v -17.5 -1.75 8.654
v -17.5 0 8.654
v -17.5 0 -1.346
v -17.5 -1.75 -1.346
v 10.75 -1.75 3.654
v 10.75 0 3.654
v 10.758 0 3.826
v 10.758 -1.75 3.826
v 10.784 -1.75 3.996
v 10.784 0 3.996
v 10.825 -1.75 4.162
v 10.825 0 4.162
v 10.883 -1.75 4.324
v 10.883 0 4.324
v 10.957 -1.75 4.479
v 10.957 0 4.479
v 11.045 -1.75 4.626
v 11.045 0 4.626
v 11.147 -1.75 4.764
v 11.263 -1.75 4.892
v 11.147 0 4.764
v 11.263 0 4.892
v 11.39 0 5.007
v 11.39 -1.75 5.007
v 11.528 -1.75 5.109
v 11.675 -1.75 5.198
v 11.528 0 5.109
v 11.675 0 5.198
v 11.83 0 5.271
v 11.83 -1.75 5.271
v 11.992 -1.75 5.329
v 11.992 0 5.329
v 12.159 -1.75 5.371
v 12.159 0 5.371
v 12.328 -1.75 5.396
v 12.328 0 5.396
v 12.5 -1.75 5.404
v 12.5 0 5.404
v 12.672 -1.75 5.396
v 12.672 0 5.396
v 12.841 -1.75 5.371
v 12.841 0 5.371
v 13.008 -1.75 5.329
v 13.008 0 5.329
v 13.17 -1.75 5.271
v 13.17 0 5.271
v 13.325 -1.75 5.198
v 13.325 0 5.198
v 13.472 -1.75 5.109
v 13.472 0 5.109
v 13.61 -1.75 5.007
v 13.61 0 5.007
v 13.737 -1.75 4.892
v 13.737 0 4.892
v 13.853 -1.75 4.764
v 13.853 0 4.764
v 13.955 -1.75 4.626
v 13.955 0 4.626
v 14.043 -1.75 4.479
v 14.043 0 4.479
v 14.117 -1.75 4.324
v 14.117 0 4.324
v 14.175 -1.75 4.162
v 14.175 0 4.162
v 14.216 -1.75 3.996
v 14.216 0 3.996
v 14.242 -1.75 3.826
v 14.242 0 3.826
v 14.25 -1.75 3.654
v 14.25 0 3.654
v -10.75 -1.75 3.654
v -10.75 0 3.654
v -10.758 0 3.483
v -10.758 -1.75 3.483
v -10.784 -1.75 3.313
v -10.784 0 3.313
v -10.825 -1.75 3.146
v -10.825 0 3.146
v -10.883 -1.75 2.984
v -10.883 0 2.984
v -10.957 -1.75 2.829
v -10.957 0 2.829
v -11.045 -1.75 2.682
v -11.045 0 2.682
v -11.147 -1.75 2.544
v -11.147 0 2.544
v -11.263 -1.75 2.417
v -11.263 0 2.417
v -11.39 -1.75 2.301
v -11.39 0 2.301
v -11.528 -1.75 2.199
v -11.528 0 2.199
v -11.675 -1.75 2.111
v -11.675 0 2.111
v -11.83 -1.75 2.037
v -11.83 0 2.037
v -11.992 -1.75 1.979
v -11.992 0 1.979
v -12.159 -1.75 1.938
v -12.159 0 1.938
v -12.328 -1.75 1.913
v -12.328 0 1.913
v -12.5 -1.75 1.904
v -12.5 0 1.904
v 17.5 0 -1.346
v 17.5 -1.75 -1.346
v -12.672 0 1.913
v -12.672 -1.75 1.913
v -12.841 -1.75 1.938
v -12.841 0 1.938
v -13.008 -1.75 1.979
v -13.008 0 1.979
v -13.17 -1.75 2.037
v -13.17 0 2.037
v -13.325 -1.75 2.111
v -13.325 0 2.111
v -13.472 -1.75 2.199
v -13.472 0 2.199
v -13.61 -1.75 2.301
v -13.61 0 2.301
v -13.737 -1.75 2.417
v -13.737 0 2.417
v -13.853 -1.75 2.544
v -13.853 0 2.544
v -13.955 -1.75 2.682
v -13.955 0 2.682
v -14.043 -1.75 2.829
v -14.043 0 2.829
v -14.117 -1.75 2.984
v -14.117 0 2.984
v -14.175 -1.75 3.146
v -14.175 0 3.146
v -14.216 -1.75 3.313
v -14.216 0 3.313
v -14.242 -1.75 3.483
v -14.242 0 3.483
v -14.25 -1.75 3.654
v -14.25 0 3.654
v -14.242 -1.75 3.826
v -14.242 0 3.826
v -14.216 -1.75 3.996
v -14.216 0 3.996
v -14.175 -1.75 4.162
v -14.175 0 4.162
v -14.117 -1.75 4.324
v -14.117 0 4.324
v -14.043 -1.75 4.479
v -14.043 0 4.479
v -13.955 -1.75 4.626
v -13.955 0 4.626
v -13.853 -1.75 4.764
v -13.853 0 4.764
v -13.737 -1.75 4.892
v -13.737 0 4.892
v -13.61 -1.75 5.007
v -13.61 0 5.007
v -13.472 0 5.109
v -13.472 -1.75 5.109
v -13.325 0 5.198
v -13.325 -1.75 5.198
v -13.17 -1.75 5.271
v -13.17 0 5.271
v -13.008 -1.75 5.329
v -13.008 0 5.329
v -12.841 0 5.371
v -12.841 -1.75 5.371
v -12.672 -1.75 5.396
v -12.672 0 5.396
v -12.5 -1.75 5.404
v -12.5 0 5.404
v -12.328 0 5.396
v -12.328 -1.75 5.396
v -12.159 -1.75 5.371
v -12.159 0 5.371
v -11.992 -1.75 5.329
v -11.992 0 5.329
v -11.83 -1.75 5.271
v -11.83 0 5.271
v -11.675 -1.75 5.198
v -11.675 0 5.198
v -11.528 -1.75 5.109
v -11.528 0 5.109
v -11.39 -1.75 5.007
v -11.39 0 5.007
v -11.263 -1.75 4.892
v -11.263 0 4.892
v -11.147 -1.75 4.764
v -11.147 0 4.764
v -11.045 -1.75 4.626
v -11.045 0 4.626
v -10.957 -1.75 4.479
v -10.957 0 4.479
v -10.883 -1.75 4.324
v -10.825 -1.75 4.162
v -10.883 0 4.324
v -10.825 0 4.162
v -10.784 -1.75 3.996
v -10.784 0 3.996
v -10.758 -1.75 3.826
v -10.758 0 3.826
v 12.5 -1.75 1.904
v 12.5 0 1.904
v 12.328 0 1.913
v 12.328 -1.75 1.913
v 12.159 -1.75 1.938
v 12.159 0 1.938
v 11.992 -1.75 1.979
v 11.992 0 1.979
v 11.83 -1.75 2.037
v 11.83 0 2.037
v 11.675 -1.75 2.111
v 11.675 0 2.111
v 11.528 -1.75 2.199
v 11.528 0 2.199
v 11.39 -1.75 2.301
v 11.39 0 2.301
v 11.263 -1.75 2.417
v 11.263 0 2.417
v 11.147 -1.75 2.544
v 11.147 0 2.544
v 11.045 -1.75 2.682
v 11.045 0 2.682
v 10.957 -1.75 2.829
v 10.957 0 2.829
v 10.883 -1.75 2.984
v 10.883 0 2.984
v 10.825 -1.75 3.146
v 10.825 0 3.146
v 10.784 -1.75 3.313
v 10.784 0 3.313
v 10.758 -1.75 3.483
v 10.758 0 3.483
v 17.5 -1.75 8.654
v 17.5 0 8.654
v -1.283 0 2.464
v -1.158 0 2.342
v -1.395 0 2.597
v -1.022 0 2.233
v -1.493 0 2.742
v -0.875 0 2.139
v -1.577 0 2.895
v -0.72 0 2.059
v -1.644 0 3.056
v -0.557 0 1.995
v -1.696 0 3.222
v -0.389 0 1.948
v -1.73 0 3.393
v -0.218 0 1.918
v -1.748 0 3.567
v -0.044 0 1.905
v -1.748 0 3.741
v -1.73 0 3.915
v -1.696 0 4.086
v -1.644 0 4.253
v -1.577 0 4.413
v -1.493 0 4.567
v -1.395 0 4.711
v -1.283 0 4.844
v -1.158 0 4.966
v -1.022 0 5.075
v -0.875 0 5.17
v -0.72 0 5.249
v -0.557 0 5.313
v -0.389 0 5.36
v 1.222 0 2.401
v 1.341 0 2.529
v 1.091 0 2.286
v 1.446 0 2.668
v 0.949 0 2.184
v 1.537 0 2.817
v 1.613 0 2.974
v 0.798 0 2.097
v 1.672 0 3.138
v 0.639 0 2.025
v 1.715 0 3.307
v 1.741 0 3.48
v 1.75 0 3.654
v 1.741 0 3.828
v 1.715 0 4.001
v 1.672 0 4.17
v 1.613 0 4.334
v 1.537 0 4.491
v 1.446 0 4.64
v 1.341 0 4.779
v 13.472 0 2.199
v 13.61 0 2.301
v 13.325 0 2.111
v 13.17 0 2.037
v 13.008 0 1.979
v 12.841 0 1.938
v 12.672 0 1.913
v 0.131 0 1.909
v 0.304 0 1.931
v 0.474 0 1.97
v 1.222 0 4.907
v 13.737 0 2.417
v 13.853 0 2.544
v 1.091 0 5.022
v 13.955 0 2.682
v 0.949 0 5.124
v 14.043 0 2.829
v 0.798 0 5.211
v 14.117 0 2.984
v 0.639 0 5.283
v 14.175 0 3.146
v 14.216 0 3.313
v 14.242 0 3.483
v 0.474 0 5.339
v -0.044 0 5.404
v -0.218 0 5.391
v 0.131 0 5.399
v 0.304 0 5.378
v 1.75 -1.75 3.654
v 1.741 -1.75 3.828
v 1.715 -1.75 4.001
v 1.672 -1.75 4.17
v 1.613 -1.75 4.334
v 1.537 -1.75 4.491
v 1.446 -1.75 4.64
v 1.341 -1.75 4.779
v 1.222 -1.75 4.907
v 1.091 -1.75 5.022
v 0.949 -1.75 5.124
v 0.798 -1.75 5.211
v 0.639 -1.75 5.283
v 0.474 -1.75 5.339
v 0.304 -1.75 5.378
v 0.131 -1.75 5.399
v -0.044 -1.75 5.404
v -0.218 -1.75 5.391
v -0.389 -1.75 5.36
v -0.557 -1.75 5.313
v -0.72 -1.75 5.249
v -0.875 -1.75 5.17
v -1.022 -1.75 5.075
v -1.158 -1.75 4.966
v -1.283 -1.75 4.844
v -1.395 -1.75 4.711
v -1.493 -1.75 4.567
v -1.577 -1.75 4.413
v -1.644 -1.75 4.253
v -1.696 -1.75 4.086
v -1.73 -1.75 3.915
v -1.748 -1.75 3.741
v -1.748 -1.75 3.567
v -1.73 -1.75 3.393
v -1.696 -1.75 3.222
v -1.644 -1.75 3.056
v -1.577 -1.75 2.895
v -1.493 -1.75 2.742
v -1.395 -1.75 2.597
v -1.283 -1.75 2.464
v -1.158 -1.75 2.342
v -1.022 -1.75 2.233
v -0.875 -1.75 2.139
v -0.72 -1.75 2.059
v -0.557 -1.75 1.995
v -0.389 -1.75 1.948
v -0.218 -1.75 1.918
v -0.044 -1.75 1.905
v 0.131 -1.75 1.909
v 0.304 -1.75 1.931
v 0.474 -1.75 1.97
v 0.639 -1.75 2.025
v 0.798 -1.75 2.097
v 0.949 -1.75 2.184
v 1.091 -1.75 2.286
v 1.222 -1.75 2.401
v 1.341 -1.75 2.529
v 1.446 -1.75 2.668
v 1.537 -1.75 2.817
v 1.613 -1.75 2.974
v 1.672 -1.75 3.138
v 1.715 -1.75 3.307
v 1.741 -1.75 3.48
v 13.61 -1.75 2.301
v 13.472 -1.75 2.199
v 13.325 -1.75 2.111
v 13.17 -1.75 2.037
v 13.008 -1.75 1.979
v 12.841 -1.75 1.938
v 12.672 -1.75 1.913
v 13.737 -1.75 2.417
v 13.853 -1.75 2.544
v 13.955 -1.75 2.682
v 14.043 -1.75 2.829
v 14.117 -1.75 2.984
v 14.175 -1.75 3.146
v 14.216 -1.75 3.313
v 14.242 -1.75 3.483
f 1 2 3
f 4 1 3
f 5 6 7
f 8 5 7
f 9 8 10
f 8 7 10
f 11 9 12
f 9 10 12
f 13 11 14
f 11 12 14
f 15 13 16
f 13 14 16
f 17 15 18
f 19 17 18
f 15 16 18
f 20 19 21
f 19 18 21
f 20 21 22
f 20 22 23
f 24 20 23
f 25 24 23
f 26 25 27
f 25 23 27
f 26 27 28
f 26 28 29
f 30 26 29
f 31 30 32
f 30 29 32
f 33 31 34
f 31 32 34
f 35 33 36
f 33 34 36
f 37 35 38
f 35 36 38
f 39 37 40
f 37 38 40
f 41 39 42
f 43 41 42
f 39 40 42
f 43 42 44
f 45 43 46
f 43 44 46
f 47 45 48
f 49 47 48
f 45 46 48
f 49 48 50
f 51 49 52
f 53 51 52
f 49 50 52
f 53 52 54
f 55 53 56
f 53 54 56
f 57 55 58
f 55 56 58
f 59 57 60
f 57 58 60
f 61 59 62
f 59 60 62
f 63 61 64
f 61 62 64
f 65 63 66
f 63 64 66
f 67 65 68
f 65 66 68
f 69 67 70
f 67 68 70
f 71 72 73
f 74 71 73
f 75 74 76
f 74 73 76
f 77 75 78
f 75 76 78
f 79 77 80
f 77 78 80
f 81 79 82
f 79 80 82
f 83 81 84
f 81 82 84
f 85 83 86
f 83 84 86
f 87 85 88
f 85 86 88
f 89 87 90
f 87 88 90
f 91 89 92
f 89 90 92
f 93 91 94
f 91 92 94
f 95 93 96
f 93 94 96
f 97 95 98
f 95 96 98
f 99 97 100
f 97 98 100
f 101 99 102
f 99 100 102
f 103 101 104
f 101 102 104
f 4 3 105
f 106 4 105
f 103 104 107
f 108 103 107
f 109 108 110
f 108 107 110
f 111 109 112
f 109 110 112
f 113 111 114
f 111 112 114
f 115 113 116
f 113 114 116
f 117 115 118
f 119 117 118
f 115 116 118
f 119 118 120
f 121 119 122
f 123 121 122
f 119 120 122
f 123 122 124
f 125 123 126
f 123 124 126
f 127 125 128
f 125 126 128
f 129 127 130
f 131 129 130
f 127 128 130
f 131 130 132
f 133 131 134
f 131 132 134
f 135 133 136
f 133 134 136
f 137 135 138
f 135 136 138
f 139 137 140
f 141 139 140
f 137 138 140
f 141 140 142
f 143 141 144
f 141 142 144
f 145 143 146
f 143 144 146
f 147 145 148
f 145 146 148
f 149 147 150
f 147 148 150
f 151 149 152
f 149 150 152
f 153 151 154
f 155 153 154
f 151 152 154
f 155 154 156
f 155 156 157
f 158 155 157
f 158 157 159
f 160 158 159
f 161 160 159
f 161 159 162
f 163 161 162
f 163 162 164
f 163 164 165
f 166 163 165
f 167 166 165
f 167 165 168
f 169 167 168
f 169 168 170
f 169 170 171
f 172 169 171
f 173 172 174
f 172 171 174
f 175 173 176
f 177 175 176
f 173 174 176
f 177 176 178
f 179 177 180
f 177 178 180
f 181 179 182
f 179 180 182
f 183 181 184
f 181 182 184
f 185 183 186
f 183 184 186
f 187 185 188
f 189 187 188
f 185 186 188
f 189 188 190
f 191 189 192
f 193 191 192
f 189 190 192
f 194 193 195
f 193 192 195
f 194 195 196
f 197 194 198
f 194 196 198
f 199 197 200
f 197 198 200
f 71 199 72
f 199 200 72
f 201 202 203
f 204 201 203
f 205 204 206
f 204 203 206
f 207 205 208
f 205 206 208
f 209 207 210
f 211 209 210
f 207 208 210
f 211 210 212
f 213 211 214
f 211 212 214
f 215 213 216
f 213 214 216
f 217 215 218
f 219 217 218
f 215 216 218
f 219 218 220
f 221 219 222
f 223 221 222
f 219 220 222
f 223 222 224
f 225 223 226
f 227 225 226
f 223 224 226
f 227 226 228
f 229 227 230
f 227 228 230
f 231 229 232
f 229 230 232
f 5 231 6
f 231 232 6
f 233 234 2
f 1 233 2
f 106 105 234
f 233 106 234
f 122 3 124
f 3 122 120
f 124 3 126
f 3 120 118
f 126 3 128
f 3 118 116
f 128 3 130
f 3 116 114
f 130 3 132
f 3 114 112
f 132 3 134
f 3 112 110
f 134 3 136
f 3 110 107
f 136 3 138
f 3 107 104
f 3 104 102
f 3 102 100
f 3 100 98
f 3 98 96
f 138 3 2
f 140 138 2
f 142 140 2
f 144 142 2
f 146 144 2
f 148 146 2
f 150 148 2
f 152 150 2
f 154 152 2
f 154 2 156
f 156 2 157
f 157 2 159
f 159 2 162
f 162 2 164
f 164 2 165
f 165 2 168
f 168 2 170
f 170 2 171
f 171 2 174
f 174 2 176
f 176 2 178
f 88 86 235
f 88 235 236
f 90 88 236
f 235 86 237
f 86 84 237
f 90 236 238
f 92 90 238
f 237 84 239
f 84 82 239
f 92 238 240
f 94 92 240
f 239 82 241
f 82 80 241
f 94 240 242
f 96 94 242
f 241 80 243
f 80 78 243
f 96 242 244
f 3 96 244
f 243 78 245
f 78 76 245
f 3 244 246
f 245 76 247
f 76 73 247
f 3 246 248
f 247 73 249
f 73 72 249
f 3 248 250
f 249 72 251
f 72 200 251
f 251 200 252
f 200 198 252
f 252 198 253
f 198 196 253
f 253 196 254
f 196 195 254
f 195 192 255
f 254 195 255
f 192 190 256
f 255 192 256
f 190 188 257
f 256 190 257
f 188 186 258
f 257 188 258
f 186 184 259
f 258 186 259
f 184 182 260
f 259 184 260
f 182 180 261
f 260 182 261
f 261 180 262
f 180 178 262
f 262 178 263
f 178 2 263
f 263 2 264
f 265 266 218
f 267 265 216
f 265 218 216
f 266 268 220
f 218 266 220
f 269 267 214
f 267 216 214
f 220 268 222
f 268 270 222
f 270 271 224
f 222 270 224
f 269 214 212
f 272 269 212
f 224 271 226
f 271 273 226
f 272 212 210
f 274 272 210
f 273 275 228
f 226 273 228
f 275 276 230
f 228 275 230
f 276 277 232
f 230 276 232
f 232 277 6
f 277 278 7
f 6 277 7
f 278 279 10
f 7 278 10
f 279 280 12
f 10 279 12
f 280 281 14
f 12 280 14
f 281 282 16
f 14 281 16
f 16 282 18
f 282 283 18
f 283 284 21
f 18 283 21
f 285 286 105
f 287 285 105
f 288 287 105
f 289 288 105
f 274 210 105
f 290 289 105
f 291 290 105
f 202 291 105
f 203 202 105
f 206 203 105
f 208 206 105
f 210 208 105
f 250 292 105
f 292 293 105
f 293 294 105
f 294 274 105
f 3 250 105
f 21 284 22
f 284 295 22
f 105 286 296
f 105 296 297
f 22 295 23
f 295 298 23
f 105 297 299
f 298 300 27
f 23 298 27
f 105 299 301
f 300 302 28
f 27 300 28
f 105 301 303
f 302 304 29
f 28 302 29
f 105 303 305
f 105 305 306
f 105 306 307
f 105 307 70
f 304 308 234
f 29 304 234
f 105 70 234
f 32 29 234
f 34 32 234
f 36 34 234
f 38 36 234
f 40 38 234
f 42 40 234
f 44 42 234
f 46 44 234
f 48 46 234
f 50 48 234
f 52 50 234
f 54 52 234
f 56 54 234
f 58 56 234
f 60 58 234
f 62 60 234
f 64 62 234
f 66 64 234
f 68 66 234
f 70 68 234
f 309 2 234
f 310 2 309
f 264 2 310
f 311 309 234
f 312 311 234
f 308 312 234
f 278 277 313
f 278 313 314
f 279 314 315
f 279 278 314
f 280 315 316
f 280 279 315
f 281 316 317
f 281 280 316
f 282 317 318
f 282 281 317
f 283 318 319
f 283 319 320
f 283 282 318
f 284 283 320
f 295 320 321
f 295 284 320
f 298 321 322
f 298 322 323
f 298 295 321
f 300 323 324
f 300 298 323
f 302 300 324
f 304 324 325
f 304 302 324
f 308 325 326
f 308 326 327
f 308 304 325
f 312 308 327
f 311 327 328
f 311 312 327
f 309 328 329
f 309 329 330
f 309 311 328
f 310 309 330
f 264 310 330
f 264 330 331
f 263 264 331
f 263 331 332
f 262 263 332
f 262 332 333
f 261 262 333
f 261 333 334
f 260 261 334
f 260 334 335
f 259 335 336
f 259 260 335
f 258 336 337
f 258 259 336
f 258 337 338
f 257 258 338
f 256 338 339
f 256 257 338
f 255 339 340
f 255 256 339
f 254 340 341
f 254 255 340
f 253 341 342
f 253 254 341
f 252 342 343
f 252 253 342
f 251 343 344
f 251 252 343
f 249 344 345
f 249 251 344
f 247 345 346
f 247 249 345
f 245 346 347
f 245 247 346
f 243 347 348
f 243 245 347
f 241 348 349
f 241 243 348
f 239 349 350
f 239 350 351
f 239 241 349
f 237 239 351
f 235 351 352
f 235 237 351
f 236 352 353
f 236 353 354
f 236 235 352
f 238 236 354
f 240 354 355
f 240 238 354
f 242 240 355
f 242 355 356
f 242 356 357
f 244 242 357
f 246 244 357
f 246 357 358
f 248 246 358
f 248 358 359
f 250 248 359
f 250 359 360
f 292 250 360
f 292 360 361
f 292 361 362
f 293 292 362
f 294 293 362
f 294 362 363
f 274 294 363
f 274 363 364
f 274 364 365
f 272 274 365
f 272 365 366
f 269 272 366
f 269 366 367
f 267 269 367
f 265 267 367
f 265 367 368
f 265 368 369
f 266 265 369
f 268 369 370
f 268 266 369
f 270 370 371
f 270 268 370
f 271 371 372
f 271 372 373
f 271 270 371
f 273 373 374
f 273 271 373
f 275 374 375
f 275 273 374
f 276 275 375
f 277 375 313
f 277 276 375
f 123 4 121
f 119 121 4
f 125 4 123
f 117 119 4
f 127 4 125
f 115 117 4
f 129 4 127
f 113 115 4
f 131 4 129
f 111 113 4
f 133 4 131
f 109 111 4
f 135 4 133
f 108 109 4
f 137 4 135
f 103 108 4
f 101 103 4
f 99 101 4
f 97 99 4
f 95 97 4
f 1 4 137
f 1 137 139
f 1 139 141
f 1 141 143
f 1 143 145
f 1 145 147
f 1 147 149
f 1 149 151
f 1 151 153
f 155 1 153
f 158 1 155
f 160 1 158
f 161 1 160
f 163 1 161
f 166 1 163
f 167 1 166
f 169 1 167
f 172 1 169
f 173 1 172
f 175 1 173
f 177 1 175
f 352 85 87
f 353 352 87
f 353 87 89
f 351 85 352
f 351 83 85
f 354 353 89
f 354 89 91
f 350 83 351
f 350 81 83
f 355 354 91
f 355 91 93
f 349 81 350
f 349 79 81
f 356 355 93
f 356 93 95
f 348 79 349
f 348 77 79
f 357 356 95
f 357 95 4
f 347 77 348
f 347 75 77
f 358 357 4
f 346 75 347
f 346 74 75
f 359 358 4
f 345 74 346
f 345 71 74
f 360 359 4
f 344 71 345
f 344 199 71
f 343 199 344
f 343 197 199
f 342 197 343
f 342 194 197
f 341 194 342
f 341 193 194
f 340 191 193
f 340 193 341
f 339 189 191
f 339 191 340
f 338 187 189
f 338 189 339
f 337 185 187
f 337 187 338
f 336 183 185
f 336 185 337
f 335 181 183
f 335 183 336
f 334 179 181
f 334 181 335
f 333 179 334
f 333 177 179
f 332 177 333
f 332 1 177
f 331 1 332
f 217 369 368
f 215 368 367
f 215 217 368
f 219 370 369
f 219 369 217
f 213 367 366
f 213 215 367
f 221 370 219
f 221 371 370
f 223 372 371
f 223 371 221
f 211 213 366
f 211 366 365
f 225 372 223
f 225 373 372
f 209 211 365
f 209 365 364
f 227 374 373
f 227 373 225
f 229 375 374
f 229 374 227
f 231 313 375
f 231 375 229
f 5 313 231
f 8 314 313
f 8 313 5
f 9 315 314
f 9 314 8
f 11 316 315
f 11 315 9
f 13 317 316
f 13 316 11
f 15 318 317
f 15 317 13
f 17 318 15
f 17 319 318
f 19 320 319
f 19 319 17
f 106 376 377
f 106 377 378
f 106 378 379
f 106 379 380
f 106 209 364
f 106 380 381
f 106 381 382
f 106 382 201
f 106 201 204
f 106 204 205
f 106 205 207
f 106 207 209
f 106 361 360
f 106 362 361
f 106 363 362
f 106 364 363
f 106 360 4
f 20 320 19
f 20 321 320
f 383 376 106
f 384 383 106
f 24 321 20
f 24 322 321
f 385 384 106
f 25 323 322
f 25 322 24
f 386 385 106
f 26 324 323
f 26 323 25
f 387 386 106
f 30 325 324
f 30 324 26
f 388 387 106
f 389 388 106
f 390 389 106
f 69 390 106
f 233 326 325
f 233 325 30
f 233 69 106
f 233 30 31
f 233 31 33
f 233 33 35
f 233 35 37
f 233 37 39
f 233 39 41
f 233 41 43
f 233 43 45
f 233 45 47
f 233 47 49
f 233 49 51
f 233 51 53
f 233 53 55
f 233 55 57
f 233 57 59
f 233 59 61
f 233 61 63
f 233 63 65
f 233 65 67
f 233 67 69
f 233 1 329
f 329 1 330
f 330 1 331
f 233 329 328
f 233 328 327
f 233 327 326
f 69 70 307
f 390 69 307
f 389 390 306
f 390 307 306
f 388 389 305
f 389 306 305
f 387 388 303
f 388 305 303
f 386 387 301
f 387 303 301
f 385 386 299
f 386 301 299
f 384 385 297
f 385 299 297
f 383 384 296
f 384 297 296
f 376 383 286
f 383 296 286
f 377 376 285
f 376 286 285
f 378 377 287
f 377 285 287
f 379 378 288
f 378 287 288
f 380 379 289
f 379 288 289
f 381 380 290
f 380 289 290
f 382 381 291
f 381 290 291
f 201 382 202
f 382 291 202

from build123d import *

# Parameters (mm, degrees)
F0_R     = 1.75
F1_DEPTH = 1.75
F2_DEPTH = 1.75


with BuildPart() as f1:
    # F0 (on Front) → F1 (new body)
    with BuildSketch(Plane.XZ):
        Polygon((17.5, 8.6541427299), (-17.5, 8.6541427299), (-17.5, -1.3458572701), (-12.5, -1.3458572701), (12.5, -1.3458572701), (17.5, -1.3458572701), align=None)
        with BuildLine():
            ThreePointArc((-10.75, 3.6541427299), (-11.2625631329, 2.4167058629), (-12.5, 1.9041427299))
            ThreePointArc((-12.5, 1.9041427299), (-13.7374368671, 4.891579597), (-10.75, 3.6541427299))
        make_face(mode=Mode.SUBTRACT)
        with Locations((0, 3.6541427299)):
            Circle(F0_R, mode=Mode.SUBTRACT)
        with BuildLine():
            ThreePointArc((14.25, 3.6541427299), (13.7374368671, 2.4167058629), (12.5, 1.9041427299))
            ThreePointArc((12.5, 1.9041427299), (11.2625631329, 2.4167058629), (10.75, 3.6541427299))
            ThreePointArc((10.75, 3.6541427299), (12.5, 5.4041427299), (14.25, 3.6541427299))
        make_face(mode=Mode.SUBTRACT)
    extrude(amount=F1_DEPTH)

    # F2 (add): a face of the model
    f2_faces = [f1.faces().sort_by_distance(p)[0] for p in [
        (17.1359945055, -1.75, 3.6541427299),
    ]]
    extrude(f2_faces, amount=-F2_DEPTH)


solid = f1.part
